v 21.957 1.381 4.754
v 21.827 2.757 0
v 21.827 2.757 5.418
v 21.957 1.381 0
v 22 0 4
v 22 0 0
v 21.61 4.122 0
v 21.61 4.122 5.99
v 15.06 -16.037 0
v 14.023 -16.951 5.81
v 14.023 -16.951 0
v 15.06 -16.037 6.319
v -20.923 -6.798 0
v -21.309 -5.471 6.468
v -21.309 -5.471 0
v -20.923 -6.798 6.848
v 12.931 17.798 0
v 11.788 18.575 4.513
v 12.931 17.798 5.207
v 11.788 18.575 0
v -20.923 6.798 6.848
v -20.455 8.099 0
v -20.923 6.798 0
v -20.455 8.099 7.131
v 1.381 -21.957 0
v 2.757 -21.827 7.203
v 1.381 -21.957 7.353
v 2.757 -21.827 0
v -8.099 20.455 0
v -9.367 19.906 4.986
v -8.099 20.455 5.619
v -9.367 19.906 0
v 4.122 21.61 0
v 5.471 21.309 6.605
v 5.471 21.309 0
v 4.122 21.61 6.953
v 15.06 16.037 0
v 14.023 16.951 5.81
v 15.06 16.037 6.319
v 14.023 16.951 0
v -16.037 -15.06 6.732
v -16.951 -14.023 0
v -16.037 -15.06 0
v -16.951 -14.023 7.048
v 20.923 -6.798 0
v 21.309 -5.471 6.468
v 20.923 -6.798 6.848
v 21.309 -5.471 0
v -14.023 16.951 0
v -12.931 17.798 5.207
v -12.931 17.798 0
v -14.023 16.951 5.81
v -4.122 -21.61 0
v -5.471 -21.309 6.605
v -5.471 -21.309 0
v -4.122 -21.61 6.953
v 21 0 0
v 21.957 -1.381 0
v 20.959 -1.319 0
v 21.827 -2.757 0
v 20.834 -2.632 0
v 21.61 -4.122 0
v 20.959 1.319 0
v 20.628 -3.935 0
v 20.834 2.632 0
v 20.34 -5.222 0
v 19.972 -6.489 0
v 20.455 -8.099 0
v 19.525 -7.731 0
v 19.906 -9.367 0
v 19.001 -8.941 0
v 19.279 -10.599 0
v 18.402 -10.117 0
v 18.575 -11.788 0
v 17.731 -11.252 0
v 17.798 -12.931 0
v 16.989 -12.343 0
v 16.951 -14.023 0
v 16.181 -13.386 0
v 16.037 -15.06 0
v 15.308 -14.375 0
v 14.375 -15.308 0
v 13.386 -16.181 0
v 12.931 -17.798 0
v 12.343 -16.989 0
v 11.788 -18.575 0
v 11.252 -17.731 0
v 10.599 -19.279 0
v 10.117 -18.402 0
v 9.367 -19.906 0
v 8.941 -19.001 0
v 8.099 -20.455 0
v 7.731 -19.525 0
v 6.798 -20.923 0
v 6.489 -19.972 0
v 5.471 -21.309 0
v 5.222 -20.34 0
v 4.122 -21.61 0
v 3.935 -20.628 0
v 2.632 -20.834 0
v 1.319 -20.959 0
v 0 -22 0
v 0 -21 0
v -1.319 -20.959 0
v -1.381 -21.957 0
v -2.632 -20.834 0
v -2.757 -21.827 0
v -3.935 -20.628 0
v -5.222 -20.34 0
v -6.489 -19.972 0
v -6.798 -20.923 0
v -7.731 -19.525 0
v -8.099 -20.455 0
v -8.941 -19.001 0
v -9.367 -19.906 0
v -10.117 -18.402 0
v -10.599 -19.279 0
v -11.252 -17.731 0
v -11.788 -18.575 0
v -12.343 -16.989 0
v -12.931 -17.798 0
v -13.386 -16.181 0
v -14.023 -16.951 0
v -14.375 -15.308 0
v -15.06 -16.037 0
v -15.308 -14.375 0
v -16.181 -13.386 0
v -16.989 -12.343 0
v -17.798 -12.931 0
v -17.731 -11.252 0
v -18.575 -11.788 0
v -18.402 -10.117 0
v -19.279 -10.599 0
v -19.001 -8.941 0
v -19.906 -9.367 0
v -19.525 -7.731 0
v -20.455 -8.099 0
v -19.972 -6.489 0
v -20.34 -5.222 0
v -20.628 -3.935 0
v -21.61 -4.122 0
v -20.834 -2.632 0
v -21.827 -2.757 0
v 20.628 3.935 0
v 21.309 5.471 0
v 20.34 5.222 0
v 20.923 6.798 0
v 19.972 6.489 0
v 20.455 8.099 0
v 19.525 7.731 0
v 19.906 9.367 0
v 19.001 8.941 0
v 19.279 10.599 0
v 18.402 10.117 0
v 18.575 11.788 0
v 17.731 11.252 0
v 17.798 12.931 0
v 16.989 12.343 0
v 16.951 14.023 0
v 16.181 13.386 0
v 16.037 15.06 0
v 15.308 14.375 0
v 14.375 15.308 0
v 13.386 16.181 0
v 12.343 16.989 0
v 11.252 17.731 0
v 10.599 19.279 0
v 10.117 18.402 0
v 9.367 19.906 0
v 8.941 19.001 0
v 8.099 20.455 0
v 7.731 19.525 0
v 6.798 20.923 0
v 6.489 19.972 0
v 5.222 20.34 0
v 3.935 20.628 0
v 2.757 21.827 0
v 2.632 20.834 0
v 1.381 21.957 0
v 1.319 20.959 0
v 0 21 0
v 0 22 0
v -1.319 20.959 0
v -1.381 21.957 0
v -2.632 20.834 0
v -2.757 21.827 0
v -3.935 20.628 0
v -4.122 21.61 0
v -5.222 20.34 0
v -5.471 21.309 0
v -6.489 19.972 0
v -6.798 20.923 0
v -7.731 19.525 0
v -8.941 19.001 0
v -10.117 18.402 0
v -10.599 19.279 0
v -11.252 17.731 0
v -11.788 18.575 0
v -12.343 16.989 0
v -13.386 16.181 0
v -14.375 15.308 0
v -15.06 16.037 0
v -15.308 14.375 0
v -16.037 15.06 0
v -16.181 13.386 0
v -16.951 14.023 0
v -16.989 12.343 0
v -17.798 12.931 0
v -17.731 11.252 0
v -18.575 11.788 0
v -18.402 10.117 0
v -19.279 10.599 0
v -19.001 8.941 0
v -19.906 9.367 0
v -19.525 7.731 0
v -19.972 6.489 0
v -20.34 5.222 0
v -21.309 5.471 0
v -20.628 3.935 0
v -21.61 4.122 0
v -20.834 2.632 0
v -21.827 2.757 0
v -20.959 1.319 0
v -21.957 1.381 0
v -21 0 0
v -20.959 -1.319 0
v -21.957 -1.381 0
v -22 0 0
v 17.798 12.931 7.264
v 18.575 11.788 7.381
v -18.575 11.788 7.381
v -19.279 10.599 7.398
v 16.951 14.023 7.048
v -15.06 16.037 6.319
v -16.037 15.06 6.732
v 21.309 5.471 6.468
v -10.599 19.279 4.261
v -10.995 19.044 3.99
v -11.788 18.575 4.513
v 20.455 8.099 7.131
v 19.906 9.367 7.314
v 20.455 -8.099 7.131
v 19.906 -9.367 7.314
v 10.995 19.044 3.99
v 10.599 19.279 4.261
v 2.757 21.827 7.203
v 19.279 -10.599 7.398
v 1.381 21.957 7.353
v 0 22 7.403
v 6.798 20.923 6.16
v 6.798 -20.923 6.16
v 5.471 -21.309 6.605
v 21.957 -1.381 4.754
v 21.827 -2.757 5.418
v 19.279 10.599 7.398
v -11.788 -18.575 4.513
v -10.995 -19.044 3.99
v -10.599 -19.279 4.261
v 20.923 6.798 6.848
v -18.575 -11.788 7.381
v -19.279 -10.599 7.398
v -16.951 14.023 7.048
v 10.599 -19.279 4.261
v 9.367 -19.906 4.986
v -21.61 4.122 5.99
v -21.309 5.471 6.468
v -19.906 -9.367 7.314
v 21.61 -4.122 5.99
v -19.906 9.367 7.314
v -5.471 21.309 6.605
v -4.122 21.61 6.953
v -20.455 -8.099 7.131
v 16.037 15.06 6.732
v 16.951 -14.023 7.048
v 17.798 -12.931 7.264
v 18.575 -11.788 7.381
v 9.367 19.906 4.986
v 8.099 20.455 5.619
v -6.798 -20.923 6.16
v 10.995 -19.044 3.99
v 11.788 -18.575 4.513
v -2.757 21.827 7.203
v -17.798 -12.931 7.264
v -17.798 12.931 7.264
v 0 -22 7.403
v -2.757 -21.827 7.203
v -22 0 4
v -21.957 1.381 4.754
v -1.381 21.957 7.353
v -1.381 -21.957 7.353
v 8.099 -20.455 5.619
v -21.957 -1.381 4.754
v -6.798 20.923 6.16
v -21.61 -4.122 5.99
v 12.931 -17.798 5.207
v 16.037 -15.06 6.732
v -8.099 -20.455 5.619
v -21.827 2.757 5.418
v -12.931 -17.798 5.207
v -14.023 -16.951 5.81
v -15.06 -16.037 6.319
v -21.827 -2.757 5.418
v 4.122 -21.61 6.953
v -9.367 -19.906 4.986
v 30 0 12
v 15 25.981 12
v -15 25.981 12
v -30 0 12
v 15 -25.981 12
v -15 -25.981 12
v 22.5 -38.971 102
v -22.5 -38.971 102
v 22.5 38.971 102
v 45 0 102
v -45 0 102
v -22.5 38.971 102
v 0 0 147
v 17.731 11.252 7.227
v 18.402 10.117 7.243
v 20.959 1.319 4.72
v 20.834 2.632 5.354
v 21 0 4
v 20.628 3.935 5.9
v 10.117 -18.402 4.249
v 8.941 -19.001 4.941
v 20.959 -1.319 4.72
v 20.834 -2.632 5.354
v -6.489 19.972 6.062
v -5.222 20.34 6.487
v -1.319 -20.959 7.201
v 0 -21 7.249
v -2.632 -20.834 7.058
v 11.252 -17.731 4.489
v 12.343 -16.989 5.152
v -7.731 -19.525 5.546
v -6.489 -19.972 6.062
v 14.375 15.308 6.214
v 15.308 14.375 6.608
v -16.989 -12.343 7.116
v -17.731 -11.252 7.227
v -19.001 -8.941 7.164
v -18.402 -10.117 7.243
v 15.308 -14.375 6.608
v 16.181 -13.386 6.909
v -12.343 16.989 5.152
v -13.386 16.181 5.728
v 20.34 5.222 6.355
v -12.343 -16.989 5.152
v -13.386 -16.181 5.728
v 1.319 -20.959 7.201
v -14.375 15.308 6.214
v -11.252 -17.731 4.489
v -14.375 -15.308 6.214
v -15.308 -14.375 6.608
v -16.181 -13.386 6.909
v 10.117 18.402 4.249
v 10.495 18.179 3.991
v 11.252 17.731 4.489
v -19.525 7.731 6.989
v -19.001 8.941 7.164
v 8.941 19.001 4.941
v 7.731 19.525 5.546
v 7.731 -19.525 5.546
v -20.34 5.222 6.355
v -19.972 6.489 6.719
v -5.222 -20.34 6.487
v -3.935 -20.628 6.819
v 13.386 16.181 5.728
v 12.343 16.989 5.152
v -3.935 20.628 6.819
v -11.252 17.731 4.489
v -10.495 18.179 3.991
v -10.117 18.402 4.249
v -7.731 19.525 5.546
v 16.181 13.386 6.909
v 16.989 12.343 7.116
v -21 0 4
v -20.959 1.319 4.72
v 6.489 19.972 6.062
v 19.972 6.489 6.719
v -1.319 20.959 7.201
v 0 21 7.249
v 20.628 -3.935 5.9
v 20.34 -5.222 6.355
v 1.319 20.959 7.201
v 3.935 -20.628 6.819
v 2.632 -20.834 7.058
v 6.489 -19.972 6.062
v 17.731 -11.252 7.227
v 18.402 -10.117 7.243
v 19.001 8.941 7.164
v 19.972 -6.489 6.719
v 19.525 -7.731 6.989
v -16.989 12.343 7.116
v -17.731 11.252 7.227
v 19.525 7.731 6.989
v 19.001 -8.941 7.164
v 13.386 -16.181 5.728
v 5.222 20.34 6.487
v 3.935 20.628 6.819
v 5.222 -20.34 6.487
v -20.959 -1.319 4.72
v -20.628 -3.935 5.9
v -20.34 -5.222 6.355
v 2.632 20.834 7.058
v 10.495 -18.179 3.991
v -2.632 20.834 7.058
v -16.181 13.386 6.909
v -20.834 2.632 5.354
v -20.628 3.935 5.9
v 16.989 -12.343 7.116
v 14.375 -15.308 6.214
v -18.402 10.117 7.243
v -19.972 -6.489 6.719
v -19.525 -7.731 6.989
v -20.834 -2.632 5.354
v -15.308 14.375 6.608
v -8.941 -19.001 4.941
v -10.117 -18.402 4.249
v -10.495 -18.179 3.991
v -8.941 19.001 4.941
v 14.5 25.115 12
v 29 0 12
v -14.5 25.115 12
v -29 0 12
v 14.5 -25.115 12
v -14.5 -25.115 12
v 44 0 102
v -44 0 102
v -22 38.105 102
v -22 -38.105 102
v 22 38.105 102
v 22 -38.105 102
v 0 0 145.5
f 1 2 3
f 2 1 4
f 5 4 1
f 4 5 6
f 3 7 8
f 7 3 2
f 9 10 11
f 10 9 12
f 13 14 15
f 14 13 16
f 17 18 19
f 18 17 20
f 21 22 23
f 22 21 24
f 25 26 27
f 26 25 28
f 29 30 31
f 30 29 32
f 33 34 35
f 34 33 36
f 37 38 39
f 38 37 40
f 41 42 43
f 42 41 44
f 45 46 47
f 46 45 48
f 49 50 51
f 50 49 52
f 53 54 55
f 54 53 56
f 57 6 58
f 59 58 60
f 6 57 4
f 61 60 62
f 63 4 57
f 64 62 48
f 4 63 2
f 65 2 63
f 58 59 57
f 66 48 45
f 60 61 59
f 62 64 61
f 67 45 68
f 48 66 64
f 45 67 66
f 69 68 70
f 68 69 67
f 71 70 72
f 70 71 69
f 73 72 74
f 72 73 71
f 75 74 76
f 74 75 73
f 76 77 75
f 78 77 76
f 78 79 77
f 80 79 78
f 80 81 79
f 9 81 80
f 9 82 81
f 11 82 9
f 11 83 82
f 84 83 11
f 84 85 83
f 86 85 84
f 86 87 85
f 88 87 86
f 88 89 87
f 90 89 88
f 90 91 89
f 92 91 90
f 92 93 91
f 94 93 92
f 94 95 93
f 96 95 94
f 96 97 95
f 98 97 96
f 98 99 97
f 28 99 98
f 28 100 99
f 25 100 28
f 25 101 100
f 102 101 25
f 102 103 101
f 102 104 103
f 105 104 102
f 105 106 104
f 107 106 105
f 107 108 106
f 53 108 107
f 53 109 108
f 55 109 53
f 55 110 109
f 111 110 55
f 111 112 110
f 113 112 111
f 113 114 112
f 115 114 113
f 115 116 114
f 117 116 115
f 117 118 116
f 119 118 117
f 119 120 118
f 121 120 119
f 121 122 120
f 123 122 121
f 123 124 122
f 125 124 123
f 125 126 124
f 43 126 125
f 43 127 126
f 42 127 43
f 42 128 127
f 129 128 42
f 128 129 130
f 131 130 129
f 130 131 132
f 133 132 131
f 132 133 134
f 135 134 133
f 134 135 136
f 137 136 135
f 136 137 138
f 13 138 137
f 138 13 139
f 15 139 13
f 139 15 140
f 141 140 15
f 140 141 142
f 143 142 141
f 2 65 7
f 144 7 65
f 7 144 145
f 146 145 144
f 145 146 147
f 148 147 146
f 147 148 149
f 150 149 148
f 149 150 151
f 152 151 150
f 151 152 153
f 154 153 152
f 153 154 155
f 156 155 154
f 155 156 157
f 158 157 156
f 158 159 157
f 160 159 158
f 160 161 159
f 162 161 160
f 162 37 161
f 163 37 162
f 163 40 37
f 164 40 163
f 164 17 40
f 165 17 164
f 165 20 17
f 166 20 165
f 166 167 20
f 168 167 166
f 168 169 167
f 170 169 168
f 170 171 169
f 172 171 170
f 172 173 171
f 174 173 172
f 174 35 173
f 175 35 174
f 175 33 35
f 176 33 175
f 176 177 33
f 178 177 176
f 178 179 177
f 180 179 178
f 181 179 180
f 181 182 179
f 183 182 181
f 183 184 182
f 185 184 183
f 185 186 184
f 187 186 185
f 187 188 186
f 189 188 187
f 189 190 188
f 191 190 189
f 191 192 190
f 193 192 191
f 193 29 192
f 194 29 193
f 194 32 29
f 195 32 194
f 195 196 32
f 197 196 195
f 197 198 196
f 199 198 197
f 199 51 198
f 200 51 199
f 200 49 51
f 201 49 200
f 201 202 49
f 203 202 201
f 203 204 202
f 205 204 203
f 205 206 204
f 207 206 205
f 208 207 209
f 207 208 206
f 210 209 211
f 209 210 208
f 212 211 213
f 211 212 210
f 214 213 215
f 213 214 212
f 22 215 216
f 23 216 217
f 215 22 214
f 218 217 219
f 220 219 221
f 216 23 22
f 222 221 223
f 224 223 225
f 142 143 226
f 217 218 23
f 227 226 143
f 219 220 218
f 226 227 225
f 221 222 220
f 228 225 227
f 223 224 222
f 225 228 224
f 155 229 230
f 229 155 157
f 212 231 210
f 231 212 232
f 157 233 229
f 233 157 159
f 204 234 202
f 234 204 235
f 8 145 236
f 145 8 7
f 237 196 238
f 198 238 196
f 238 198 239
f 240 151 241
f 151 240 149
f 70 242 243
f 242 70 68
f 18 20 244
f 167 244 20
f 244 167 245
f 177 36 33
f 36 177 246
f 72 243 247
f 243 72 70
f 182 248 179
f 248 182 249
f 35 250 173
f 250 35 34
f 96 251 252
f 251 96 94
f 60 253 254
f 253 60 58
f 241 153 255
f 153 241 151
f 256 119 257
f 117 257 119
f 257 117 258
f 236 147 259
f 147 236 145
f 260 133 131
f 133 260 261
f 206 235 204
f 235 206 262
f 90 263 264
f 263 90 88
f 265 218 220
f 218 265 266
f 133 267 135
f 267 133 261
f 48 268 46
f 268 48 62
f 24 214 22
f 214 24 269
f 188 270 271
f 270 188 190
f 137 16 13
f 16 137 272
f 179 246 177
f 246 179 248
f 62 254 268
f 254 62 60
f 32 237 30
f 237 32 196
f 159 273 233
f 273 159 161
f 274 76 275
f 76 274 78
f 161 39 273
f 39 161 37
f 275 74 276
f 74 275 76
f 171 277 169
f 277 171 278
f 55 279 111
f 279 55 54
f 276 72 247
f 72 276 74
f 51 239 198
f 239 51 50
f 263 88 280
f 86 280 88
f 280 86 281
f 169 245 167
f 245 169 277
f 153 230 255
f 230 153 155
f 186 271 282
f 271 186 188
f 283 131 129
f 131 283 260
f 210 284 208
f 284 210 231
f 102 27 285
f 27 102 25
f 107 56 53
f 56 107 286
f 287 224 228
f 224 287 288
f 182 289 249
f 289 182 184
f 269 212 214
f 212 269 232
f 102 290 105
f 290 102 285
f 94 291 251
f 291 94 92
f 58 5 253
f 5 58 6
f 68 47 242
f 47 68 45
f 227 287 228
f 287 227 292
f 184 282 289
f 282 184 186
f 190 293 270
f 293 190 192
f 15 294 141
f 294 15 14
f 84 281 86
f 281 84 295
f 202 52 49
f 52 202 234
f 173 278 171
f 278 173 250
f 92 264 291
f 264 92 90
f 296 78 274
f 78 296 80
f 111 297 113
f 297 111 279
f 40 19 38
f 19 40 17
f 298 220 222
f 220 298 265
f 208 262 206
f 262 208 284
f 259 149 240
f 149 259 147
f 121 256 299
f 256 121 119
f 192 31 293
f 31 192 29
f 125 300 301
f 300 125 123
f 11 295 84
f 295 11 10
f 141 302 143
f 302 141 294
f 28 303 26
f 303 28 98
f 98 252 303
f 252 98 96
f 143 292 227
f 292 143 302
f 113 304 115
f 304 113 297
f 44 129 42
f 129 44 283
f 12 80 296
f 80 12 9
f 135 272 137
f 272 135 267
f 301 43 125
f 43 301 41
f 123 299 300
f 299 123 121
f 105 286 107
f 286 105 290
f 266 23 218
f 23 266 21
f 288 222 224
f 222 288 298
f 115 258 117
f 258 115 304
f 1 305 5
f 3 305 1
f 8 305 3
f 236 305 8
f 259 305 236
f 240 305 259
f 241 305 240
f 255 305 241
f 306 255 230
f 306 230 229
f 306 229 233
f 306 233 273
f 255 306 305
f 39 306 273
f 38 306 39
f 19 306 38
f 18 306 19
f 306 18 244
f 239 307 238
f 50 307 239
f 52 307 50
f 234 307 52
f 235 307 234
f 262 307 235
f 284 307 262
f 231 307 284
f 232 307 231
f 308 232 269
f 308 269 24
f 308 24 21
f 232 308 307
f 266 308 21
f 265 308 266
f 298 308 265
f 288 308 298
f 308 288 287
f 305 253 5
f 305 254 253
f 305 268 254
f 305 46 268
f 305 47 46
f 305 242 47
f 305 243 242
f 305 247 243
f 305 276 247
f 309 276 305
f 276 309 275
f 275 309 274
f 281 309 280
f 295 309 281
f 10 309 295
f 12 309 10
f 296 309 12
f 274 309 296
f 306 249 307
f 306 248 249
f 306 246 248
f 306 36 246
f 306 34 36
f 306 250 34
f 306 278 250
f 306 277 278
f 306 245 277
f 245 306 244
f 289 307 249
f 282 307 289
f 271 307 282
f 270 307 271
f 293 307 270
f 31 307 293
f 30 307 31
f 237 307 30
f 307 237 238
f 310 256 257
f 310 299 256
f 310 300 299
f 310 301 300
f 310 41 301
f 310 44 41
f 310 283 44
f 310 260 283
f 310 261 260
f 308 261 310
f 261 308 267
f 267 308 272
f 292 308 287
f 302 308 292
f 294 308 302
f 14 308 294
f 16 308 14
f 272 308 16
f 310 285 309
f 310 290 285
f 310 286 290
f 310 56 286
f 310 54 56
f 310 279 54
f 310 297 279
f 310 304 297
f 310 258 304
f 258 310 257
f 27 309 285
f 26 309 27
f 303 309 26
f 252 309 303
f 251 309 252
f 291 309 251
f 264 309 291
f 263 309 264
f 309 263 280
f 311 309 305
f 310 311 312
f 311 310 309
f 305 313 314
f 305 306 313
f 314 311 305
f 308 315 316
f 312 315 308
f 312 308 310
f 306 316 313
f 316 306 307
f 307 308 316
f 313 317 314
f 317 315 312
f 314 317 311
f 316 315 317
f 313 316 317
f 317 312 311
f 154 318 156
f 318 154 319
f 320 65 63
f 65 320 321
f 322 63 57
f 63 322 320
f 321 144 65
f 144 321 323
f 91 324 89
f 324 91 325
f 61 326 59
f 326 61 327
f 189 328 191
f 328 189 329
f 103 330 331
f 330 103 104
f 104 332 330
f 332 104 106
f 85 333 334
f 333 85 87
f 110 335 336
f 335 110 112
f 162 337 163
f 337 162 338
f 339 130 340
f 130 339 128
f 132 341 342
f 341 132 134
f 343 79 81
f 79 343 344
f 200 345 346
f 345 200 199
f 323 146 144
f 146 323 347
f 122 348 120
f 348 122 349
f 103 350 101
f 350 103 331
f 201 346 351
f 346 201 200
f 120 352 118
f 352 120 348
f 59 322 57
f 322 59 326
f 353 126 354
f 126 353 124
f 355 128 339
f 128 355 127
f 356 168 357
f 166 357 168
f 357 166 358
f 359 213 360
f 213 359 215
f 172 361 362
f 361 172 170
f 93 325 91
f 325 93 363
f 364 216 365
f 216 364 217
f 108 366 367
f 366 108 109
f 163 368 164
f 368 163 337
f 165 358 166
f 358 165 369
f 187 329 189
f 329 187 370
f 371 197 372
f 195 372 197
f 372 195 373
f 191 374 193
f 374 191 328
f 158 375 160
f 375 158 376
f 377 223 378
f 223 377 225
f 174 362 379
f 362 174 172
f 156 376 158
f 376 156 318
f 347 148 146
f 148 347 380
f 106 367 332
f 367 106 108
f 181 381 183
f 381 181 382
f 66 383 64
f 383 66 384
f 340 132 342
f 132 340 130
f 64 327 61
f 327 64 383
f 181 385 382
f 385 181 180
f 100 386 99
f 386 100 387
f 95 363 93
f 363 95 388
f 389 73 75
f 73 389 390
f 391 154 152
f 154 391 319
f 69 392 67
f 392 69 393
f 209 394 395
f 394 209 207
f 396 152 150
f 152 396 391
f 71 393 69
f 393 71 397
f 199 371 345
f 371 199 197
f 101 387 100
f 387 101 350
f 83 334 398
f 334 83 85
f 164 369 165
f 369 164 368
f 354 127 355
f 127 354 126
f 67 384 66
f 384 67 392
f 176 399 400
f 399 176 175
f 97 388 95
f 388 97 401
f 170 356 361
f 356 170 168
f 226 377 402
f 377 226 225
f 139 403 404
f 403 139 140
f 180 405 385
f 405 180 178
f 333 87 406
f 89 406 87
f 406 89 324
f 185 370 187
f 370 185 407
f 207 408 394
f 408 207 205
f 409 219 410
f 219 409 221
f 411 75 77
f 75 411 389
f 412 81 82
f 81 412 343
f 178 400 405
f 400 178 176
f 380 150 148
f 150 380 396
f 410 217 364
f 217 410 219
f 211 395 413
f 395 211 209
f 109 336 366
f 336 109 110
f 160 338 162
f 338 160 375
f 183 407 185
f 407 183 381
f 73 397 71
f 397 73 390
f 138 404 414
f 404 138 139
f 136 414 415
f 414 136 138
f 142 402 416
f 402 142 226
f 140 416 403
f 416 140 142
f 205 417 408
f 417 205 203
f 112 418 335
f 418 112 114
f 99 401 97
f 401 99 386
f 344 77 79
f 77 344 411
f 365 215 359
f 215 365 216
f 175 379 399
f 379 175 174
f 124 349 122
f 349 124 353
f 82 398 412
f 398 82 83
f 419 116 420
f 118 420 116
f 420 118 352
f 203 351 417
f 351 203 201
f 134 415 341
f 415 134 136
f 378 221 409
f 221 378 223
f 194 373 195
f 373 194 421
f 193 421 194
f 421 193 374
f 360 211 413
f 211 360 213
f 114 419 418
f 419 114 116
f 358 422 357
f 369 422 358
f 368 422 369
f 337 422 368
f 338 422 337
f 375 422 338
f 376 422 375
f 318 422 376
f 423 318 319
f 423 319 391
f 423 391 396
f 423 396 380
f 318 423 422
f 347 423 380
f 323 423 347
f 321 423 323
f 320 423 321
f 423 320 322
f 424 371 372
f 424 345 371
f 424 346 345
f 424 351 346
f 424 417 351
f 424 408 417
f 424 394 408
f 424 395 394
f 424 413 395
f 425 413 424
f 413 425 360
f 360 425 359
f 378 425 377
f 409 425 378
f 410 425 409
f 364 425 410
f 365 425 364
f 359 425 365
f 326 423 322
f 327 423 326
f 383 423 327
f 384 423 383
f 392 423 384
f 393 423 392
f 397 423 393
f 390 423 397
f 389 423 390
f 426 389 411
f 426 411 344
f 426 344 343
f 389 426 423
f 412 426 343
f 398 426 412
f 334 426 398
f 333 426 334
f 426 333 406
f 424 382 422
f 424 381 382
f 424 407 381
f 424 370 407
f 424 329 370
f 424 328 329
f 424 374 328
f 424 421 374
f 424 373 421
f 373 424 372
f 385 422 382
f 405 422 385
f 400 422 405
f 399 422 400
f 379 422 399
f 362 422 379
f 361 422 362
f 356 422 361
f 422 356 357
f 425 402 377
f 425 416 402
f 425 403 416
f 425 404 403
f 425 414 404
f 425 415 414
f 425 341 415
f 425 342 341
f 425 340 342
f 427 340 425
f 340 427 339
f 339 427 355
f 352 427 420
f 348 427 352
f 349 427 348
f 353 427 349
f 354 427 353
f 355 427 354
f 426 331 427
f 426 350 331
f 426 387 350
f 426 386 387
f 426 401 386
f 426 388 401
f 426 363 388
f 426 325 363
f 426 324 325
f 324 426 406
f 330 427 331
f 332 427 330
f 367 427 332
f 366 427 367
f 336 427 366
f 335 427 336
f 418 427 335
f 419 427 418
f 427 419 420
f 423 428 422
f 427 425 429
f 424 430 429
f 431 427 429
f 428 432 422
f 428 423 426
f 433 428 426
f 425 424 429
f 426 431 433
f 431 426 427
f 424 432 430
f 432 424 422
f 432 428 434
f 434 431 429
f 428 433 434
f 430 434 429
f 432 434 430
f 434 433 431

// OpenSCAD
//Make EPIC custom crystal lamps

//https://www.youtube.com/watch?v=HZKu9QMN5xw&ab_channel=bigclivedotcom

//Lamp cap globe-style quartz crystal.
//You can adjust the five variables below
base=44;      //Diameter of base for lamp
rim=4;            //Length of rim at base
size=60;        //Diameter of crystal
facets=6;      //Number of sides (default 6)
scaling=1.5;  //Scale of crystal length (default 1.5)
//Don't change variables below here
half=size/2;
upper=half-(base/2)+rim;
$fn=facets;
difference(){
union(){
//outer body
translate([0,0,0])
cylinder(h=4+rim,d1=base,d2=base,$fn=100);
translate([0,0,-(base/2)+rim])
cylinder(h=half,d1=0,d2=size);
translate([0,0,upper])
cylinder(h=size*scaling,d1=size,d2=half*3);
translate([0,0,upper+size*scaling])
cylinder(h=(half*3)/2,d1=half*3,d2=0);
}
//Inner core.
translate([0,0,-1])
cylinder(h=6+rim,d1=base-2,d2=base-2,$fn=100);
translate([0,0,-(base/2)+rim+1])
cylinder(h=half-1,d1=0,d2=size-2);
translate([0,0,upper])
cylinder(h=size*scaling,d1=size-2,d2=(half*3)-2);
translate([0,0,upper+size*scaling])
cylinder(h=(half*3)/2-1.5,d1=(half*3)-2,d2=0);
translate([-half,-half,-half])
cube([size,size,half]);
//x-ray box
//translate([-80,-80,-50])
//cube([160,80,280]);
}
